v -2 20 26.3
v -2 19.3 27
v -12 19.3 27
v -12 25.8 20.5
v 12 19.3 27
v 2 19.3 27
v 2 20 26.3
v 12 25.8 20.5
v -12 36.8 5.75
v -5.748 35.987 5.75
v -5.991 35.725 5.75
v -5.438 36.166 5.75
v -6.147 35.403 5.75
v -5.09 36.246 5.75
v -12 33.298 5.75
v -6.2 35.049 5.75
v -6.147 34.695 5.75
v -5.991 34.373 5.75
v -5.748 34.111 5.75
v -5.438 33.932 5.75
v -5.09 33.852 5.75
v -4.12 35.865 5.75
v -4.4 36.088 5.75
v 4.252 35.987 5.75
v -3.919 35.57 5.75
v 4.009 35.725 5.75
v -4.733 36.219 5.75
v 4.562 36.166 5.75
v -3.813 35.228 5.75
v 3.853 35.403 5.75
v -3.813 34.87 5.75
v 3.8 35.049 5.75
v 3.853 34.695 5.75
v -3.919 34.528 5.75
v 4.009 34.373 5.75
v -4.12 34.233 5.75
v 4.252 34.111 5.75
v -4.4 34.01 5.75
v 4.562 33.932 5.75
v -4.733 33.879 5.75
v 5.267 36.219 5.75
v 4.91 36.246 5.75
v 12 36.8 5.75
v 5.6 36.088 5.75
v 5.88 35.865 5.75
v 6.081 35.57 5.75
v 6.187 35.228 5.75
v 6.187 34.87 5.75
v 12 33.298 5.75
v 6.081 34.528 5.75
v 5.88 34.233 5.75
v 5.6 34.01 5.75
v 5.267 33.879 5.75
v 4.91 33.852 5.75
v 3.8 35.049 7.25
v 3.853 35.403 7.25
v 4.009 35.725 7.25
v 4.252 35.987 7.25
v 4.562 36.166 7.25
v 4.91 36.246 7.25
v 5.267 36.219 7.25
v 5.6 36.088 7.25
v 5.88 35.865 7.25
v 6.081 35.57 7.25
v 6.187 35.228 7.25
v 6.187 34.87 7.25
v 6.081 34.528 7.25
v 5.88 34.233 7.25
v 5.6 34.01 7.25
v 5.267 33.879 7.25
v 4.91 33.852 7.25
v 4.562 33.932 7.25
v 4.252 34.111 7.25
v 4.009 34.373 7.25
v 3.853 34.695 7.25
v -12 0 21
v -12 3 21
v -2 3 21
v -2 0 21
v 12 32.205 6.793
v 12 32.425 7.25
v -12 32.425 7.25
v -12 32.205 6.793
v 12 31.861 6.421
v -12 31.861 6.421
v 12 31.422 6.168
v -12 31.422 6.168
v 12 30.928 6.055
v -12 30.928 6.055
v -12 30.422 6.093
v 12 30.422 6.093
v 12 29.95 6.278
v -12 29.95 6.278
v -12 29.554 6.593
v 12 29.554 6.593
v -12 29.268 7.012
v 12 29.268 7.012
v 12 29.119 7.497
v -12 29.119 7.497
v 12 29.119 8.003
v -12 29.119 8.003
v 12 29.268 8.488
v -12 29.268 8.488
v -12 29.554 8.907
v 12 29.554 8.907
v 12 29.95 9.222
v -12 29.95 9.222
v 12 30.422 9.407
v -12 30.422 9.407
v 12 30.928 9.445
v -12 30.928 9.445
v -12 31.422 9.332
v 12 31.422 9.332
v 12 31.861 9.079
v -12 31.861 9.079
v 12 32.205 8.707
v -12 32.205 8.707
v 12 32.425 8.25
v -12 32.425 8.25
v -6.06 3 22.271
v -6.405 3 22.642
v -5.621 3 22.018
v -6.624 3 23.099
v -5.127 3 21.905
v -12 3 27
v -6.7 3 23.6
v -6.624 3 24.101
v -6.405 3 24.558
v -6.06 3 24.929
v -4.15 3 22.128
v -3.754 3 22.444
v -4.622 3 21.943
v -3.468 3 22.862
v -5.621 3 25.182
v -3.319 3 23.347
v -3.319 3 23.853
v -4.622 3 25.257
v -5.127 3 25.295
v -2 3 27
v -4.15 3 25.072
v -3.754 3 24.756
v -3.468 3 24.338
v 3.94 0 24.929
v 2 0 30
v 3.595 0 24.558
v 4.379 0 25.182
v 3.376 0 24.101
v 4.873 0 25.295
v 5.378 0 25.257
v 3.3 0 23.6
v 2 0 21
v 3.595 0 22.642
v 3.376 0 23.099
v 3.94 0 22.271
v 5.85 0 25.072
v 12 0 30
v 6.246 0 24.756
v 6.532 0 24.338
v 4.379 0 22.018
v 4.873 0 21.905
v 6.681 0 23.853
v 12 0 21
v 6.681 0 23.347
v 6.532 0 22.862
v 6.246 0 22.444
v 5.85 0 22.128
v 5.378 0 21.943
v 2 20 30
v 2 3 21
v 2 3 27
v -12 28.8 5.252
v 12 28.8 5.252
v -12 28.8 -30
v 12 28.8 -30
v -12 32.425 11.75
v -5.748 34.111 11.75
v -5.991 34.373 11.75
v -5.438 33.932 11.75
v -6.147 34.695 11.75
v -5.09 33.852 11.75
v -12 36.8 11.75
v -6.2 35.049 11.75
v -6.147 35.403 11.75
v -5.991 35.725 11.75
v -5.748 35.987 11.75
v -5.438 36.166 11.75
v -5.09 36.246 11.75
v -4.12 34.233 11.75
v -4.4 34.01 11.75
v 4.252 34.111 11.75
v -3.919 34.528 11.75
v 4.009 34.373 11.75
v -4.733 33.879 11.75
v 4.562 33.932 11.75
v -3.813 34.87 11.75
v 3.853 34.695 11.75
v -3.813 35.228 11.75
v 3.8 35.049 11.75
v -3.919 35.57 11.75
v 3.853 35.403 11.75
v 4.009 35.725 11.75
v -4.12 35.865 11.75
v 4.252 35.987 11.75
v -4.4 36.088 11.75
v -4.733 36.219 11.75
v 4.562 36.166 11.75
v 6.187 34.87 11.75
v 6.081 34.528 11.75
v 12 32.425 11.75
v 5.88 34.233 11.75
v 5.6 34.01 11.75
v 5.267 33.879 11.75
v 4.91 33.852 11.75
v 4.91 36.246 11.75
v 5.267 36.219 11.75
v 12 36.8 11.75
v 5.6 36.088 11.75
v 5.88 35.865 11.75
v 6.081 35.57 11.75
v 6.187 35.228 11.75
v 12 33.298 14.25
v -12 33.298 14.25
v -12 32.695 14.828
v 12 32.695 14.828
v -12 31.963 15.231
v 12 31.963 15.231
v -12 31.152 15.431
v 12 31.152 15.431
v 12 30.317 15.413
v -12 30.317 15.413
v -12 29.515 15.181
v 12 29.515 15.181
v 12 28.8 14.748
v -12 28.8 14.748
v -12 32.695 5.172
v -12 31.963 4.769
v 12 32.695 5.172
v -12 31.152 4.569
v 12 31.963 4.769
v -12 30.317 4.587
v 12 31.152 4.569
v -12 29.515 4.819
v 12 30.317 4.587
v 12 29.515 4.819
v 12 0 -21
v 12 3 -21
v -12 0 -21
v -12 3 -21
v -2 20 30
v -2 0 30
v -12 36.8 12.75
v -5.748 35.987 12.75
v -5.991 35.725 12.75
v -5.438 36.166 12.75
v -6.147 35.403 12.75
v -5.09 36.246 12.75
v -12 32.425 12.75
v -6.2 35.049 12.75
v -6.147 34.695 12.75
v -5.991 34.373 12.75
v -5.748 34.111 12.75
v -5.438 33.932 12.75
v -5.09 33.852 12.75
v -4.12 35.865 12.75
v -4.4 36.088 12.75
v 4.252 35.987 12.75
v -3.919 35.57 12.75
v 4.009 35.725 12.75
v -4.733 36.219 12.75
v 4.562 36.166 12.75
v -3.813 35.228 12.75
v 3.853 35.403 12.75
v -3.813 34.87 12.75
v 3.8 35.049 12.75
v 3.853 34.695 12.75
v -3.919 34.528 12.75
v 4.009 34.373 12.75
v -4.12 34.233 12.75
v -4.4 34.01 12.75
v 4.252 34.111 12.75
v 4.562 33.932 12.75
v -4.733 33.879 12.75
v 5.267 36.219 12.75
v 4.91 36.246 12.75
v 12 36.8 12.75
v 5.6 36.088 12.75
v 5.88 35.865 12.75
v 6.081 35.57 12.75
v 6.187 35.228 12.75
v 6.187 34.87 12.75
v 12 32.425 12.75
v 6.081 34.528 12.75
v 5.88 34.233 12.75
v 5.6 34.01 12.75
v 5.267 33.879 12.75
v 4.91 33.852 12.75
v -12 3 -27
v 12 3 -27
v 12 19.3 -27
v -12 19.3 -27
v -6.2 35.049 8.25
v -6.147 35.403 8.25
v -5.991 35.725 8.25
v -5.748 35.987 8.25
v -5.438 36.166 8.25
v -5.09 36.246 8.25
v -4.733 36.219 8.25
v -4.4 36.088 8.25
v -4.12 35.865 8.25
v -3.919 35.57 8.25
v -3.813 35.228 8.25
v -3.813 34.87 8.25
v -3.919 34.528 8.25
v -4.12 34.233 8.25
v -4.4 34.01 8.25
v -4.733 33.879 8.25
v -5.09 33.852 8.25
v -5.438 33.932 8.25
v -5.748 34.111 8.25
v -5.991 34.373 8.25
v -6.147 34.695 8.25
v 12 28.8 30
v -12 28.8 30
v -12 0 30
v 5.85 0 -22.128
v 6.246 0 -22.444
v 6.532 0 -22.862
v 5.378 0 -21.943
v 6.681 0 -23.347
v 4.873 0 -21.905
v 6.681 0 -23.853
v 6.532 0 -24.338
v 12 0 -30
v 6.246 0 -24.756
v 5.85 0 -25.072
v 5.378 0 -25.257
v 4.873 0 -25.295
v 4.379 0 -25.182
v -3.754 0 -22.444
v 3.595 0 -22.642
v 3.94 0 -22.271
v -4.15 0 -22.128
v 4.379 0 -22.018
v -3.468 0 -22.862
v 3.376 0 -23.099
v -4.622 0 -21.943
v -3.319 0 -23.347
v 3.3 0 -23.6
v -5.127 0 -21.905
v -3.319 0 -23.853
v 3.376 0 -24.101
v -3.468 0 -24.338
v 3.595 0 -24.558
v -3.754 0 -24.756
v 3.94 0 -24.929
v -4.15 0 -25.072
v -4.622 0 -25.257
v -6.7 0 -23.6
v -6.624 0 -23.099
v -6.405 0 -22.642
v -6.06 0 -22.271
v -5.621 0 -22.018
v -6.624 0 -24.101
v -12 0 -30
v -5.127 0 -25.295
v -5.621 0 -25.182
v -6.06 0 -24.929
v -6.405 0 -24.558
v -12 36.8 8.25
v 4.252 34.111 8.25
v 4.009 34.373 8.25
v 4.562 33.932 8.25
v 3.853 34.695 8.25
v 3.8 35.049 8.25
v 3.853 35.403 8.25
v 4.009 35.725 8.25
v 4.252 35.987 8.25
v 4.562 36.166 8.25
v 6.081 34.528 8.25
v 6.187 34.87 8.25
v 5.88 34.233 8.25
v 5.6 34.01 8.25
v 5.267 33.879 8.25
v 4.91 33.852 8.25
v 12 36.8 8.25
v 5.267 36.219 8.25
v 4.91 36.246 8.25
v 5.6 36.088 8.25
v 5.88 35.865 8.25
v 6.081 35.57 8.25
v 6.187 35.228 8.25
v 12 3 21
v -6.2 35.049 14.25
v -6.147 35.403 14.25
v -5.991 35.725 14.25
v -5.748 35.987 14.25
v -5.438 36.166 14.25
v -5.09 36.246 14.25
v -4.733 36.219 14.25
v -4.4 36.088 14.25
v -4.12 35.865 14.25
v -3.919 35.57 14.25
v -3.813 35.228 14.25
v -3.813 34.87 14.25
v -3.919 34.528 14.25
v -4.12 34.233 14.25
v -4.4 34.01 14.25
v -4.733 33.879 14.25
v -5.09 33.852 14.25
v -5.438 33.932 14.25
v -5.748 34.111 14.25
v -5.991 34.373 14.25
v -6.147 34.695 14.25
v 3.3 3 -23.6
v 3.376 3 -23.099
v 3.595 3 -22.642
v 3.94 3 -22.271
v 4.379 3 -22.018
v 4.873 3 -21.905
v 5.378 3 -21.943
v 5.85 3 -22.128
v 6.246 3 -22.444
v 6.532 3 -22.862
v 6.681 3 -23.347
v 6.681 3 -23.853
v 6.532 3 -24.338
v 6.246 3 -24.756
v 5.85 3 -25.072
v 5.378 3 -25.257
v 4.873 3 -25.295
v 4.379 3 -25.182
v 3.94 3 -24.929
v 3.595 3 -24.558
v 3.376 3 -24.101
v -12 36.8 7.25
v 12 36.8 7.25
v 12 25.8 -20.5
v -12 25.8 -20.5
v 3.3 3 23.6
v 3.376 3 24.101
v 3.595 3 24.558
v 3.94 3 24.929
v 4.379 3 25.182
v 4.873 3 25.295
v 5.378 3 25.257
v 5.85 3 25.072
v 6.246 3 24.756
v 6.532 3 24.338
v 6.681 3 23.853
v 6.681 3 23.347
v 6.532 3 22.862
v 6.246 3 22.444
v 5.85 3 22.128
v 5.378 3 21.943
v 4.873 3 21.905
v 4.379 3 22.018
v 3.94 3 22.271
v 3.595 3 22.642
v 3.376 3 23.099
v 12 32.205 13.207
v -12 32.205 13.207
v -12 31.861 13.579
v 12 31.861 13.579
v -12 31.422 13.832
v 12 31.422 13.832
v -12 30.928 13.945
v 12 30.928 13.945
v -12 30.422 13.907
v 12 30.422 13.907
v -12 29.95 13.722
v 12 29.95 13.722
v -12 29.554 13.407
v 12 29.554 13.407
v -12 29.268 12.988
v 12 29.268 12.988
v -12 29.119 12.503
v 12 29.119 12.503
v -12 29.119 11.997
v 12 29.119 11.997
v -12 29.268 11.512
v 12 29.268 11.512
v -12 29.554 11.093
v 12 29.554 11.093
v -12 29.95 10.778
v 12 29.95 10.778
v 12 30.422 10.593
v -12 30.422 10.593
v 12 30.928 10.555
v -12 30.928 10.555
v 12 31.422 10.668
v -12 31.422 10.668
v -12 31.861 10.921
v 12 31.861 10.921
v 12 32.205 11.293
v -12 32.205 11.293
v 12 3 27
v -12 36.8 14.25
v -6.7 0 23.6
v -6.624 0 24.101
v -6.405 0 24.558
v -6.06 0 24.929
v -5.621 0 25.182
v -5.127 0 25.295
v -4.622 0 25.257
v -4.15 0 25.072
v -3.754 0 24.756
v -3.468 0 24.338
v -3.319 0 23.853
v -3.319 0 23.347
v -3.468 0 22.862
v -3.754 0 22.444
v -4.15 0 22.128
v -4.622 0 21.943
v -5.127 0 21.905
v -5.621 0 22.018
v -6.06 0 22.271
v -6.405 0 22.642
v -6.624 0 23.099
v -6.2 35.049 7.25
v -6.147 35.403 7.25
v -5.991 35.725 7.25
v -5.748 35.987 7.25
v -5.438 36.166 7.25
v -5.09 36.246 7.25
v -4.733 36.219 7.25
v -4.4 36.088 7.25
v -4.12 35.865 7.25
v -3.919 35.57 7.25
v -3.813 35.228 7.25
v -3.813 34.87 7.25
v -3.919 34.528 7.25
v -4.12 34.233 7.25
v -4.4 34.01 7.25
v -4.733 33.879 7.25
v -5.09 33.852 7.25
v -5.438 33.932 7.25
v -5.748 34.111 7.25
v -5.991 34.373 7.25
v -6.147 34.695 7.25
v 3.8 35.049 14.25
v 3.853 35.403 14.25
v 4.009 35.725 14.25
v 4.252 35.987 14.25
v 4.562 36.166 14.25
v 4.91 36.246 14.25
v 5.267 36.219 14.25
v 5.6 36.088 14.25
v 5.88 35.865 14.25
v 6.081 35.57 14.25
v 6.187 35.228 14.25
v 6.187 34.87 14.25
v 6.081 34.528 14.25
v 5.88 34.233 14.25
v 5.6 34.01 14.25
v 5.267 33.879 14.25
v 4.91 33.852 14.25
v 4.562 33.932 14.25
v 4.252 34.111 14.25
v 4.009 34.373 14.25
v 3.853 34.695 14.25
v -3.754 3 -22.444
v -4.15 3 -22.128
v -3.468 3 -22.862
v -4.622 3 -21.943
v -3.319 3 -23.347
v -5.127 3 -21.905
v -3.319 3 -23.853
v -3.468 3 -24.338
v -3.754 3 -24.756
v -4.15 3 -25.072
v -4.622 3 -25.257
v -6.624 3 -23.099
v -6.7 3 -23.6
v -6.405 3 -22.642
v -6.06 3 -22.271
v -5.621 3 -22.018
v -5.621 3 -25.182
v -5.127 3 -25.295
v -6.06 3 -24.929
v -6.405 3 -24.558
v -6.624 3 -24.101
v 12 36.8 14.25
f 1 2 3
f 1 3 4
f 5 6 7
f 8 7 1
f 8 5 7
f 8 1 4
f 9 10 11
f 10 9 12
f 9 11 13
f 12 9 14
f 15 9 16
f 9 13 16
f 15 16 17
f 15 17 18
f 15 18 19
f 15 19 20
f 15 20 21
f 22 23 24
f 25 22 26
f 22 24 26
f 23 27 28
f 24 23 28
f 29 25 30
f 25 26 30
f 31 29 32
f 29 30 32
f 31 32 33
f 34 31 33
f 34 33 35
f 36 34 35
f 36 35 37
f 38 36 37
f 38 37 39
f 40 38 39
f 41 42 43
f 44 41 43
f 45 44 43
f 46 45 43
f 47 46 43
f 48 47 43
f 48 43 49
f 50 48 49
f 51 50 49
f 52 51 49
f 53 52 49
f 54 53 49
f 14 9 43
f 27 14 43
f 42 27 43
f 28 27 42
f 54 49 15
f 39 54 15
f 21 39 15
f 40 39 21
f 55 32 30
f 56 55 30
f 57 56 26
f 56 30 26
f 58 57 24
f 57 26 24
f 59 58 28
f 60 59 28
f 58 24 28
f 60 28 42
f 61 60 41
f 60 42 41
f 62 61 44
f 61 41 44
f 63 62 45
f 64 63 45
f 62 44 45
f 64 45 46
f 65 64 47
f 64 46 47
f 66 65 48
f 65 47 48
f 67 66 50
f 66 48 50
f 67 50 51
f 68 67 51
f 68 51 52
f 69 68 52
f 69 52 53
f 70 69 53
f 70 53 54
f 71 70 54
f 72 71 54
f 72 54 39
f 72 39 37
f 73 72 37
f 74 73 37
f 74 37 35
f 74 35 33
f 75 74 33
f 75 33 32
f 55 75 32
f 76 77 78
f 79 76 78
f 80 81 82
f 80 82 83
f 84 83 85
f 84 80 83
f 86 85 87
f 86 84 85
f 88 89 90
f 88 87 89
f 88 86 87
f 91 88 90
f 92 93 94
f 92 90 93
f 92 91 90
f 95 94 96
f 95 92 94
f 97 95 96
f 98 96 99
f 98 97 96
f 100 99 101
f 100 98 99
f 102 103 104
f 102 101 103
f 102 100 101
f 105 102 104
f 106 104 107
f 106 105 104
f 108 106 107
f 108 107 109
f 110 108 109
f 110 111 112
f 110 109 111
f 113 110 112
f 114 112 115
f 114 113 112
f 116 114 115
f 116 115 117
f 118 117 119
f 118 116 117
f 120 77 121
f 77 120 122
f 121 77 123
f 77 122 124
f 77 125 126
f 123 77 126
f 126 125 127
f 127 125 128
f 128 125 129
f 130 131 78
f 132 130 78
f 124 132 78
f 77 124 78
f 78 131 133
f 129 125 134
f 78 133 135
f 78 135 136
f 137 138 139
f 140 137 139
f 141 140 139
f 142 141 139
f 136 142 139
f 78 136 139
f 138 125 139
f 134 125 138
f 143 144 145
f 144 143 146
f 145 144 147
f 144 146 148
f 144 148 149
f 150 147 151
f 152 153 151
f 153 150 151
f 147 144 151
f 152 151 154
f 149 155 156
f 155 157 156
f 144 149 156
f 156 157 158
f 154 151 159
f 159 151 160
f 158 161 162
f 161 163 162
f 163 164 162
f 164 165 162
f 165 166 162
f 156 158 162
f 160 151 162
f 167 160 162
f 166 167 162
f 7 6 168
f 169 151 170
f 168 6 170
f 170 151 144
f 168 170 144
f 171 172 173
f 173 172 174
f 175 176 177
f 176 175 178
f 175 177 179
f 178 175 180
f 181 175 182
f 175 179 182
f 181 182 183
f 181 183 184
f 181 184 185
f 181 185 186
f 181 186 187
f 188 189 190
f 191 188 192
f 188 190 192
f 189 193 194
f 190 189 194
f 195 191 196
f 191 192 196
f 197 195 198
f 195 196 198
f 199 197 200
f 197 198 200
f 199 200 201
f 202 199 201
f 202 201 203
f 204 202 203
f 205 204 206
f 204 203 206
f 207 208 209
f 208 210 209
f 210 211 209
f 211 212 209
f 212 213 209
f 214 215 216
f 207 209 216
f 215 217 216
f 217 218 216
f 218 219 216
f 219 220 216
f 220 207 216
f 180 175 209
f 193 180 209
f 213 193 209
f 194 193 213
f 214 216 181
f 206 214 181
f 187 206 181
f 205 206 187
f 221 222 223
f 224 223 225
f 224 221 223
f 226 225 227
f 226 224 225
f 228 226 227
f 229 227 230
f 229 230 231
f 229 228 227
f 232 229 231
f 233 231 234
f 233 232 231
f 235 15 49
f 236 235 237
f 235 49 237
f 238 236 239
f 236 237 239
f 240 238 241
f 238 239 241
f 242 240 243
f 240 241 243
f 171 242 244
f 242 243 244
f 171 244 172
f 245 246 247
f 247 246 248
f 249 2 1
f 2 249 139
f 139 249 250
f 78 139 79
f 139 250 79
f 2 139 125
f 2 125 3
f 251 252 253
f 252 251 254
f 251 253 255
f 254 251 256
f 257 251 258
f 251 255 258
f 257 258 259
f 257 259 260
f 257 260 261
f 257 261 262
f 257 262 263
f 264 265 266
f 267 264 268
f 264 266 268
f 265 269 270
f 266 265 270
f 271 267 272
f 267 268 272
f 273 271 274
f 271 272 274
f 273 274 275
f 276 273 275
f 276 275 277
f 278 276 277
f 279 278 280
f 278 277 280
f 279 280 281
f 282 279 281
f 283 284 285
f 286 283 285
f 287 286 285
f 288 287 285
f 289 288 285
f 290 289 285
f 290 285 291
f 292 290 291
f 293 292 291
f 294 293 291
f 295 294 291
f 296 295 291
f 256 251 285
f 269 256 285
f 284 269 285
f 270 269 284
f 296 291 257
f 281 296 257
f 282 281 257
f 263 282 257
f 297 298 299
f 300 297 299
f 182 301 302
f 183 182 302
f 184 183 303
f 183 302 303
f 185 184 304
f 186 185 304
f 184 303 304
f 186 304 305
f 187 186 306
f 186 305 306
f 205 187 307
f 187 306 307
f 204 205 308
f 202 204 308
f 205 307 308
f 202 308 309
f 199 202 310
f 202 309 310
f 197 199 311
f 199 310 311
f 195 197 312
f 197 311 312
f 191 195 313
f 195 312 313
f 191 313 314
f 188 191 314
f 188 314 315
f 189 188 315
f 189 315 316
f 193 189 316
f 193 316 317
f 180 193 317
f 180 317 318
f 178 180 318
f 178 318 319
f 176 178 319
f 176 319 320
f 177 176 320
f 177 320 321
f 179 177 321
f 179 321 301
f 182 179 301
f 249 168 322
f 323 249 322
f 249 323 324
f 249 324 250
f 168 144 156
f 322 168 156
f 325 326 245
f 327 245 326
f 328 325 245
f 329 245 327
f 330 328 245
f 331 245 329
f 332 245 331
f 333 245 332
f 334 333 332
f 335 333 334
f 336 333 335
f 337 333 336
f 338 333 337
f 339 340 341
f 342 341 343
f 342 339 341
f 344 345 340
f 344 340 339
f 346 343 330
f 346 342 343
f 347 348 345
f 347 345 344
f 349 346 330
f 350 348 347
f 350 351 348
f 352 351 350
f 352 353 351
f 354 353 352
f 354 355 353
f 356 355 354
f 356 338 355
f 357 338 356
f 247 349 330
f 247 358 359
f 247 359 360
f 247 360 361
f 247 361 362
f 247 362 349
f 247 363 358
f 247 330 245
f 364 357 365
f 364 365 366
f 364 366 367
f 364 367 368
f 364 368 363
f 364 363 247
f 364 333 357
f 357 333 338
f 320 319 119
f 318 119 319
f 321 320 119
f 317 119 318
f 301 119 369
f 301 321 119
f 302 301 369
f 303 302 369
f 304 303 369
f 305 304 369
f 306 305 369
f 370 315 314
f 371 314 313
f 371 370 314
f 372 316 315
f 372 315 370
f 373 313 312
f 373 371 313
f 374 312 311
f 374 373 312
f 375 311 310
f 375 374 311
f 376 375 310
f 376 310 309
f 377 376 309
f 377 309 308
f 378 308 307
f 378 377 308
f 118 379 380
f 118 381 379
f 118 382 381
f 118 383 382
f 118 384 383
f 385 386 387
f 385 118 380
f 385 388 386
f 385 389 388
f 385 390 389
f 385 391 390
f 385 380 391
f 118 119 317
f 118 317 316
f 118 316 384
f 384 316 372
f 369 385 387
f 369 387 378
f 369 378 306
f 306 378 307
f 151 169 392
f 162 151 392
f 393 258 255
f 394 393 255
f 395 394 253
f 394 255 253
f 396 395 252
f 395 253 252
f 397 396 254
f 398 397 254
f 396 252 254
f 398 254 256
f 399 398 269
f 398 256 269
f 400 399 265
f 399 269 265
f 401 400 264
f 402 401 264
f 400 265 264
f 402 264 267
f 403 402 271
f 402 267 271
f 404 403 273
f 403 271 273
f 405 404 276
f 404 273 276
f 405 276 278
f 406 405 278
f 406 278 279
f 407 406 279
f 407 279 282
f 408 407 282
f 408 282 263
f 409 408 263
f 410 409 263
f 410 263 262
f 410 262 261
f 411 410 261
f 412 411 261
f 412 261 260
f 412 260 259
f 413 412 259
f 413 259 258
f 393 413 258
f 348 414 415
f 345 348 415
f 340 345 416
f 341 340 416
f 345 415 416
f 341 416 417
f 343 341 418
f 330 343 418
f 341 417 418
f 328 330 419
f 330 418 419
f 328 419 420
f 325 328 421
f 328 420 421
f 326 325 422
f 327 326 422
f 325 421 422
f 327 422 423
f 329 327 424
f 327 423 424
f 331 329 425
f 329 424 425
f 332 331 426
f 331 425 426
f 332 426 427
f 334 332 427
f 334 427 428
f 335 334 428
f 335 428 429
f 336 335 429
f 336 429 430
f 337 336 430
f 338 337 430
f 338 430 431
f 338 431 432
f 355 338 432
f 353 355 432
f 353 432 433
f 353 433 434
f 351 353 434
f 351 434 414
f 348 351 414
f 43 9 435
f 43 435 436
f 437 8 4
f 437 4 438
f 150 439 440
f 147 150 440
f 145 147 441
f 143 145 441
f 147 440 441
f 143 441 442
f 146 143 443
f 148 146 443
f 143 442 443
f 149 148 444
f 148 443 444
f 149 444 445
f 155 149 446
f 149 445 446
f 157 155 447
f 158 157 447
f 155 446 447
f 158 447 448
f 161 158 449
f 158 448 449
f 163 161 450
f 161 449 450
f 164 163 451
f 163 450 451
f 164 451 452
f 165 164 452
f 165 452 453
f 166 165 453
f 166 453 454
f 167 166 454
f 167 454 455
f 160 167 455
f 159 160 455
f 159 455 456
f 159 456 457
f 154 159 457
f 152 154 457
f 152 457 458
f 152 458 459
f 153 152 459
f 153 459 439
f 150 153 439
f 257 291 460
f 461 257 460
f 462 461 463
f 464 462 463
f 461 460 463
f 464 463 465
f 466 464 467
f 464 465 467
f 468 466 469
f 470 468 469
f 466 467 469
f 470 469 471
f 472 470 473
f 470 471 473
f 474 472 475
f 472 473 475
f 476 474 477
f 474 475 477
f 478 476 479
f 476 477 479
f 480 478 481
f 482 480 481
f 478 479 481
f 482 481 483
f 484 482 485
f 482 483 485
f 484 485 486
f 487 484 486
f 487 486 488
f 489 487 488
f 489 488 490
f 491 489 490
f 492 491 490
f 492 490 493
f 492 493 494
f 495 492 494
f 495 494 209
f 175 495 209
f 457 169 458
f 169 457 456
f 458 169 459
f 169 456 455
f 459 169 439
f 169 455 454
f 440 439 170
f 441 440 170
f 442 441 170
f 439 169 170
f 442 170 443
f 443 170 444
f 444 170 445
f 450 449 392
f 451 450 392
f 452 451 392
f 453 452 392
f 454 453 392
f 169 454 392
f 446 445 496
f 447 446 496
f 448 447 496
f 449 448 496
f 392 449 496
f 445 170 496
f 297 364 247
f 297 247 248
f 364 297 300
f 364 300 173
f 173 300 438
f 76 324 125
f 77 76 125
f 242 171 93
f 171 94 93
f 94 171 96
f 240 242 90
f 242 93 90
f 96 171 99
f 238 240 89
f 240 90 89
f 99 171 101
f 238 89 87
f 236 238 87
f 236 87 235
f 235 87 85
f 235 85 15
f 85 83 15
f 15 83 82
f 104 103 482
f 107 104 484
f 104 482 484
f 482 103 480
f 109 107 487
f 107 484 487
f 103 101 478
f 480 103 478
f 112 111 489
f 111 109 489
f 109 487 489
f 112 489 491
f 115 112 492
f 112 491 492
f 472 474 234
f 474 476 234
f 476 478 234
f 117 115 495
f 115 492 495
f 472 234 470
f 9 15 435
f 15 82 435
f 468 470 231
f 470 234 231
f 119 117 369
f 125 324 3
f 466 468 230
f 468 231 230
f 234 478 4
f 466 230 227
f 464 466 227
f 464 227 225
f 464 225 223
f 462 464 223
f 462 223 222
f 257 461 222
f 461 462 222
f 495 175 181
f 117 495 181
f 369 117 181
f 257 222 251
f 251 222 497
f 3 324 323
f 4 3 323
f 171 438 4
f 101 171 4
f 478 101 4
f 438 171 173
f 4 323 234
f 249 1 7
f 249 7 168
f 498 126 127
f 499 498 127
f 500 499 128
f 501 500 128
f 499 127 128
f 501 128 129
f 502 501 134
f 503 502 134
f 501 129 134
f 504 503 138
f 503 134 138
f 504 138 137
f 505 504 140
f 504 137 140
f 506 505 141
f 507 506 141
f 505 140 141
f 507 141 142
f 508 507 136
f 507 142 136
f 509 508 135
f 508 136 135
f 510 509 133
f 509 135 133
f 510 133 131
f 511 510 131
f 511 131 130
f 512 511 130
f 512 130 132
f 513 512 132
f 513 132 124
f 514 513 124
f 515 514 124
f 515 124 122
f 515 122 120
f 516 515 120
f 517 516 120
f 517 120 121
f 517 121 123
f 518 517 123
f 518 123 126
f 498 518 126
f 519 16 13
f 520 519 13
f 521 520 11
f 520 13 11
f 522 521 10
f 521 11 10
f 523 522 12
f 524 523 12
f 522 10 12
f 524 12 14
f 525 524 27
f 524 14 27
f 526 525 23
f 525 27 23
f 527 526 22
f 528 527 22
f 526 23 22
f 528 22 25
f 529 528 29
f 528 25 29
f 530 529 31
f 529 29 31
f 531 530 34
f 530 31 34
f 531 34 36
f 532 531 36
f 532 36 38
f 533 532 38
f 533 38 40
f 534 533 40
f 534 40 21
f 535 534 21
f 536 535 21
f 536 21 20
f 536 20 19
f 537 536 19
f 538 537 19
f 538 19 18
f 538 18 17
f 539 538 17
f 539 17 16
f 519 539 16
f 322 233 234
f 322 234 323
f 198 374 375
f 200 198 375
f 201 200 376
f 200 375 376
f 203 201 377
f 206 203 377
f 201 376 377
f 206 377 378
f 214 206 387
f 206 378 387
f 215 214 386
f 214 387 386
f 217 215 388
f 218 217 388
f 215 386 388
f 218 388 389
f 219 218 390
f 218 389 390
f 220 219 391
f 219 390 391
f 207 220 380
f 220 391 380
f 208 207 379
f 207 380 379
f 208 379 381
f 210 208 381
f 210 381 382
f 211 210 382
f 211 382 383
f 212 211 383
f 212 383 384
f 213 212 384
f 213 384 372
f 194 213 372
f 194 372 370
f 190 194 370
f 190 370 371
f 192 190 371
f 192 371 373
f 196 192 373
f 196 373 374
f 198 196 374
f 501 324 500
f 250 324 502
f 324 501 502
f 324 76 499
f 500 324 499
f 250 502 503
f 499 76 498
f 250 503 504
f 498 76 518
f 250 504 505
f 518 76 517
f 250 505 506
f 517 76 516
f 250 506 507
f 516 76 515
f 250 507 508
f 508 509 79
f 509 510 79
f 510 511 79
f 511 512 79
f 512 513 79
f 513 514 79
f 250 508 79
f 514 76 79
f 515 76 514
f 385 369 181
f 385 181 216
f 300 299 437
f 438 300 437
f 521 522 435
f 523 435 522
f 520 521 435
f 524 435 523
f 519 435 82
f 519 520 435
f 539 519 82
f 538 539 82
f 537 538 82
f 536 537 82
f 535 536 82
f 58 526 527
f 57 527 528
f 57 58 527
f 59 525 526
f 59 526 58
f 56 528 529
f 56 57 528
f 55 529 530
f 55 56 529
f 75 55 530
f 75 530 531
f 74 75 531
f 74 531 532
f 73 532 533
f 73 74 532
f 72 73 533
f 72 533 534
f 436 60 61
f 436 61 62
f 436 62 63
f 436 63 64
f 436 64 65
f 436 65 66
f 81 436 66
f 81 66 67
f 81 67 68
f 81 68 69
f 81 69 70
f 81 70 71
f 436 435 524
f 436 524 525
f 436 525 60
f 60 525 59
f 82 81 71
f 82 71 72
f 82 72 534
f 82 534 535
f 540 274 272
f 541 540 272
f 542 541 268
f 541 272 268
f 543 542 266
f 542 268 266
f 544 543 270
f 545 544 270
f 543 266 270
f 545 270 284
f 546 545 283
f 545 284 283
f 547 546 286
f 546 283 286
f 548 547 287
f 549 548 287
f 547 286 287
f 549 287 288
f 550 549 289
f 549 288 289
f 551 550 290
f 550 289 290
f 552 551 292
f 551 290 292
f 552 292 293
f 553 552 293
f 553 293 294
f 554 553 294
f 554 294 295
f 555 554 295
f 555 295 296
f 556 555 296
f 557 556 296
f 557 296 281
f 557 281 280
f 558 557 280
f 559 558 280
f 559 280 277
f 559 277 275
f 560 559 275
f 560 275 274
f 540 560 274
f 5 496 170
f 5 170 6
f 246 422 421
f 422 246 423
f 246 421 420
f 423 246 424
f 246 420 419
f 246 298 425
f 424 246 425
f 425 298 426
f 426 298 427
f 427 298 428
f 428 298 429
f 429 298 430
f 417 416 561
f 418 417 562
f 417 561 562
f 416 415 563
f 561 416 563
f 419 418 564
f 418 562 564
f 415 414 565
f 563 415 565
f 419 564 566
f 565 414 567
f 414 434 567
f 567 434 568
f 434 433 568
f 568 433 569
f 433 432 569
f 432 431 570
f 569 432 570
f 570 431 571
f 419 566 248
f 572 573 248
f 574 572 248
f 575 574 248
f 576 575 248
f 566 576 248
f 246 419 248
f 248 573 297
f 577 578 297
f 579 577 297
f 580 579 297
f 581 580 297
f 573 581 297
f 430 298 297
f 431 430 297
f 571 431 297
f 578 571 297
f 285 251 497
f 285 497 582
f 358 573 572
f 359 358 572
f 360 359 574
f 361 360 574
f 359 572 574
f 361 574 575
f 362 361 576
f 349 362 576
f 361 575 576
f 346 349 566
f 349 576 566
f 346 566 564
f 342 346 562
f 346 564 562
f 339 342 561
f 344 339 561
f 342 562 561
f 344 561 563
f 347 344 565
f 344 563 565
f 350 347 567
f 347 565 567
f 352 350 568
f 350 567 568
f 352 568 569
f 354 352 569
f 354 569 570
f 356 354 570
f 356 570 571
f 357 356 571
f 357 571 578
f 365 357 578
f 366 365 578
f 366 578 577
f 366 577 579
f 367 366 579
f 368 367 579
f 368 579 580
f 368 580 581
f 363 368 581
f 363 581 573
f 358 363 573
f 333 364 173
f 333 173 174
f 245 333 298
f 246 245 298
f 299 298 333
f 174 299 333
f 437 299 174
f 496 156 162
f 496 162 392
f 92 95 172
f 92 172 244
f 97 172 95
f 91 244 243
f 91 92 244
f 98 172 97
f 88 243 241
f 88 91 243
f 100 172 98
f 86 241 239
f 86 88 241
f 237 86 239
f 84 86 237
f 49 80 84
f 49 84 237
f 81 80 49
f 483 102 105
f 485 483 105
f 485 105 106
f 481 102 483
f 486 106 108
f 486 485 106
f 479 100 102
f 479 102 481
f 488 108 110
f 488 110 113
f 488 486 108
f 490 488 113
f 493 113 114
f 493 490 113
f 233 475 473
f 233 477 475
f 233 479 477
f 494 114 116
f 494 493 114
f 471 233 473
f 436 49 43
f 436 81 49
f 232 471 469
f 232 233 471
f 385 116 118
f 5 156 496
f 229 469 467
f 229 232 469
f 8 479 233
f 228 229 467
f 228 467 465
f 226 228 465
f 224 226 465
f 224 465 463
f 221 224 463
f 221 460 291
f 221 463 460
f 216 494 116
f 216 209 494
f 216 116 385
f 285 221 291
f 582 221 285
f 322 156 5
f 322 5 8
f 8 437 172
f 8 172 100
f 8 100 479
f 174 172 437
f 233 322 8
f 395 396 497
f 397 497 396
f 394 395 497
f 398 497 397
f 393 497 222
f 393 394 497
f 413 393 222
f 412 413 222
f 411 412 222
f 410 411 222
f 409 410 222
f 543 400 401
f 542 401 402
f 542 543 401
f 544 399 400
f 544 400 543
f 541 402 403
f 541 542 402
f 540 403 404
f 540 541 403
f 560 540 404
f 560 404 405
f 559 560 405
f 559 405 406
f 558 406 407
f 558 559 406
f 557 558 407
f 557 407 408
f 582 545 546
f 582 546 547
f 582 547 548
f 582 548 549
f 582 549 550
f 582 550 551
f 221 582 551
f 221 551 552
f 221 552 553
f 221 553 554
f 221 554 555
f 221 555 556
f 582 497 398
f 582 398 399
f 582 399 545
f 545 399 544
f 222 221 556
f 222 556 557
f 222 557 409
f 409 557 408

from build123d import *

# Parameters (mm, degrees)
SKETCH1_W           = 24
SKETCH1_H           = 60
BOSS_EXTRUDE1_DEPTH = 36.8
CUT_EXTRUDE1_DEPTH  = 54.2
CUT_EXTRUDE2_DEPTH  = 54.2
SKETCH4_R           = 1.2
CUT_EXTRUDE3_DEPTH  = 53.690630097
SKETCH5_W           = 54
SKETCH5_H           = 25.8
CUT_EXTRUDE4_DEPTH  = 54.2
SKETCH6_W           = 24
SKETCH6_H           = 3
BOSS_EXTRUDE2_DEPTH = 9
SKETCH7_W           = 24
SKETCH7_H           = 3
BOSS_EXTRUDE3_DEPTH = 9
SKETCH8_R           = 1.7
CUT_EXTRUDE5_DEPTH  = 6
SKETCH9_W           = 4
SKETCH9_H           = 20
CUT_EXTRUDE6_DEPTH  = 17
CHAMFER1_SIZE       = 6.5


with BuildPart() as part:
    # Sketch1 → Boss-Extrude1 (new body)
    with BuildSketch(Plane(origin=(0, 0, 0), x_dir=(1, 0, 0), z_dir=(0, 1, 0))):
        Rectangle(SKETCH1_W, SKETCH1_H)
    extrude(amount=BOSS_EXTRUDE1_DEPTH)

    # Sketch2 → Cut-Extrude1 (cut, through all)
    with BuildSketch(Plane(origin=(12, 0, 0), x_dir=(0, 0, -1), z_dir=(1, 0, 0))):
        with BuildLine():
            Line((-12.75, 36.8), (-12.75, 32.424807681))
            ThreePointArc((-12.75, 32.424807681), (-12.25, 29.1), (-11.75, 32.424807681))
            Line((-11.75, 32.424807681), (-11.75, 36.8))
            Line((-11.75, 36.8), (-12.75, 36.8))
        make_face()
        with BuildLine():
            Line((-8.25, 32.424807681), (-8.25, 36.8))
            Line((-8.25, 36.8), (-7.25, 36.8))
            Line((-7.25, 36.8), (-7.25, 32.424807681))
            ThreePointArc((-7.25, 32.424807681), (-7.75, 29.1), (-8.25, 32.424807681))
        make_face()
    extrude(amount=-CUT_EXTRUDE1_DEPTH, mode=Mode.SUBTRACT)

    # Sketch3 → Cut-Extrude2 (cut, through all)
    with BuildSketch(Plane(origin=(12, 0, 0), x_dir=(0, 0, -1), z_dir=(1, 0, 0))):
        with BuildLine():
            Line((-14.25, 36.8), (-14.25, 33.297999199))
            ThreePointArc((-14.25, 33.297999199), (-15.430565736, 31.152138611), (-14.747999199, 28.8))
            Line((-14.747999199, 28.8), (-30, 28.8))
            Line((-30, 28.8), (-30, 36.8))
            Line((-30, 36.8), (-14.25, 36.8))
        make_face()
        with BuildLine():
            Line((30, 28.8), (30, 36.8))
            Line((30, 36.8), (-5.75, 36.8))
            Line((-5.75, 36.8), (-5.75, 33.297999199))
            ThreePointArc((-5.75, 33.297999199), (-4.569434264, 31.152138611), (-5.252000801, 28.8))
            Line((-5.252000801, 28.8), (30, 28.8))
        make_face()
    extrude(amount=-CUT_EXTRUDE2_DEPTH, mode=Mode.SUBTRACT)

    # Sketch4 → Cut-Extrude3 (cut, through all)
    with BuildSketch(Plane(origin=(0, 0, 5.75), x_dir=(-1, 0, 0), z_dir=(0, 0, -1))):
        with Locations((-5, 35.0489996)):
            Circle(SKETCH4_R)
        with Locations((5, 35.0489996)):
            Circle(SKETCH4_R)
    extrude(amount=-CUT_EXTRUDE3_DEPTH, mode=Mode.SUBTRACT)

    # Sketch5 → Cut-Extrude4 (cut, through all)
    with BuildSketch(Plane(origin=(12, 0, 0), x_dir=(0, 0, -1), z_dir=(1, 0, 0))):
        with Locations((0, 12.9)):
            Rectangle(SKETCH5_W, SKETCH5_H)
    extrude(amount=-CUT_EXTRUDE4_DEPTH, mode=Mode.SUBTRACT)

    # Sketch6 → Boss-Extrude2 (add)
    with BuildSketch(Plane(origin=(0, 0, -30), x_dir=(-1, 0, 0), z_dir=(0, 0, -1))):
        with Locations((0, 1.5)):
            Rectangle(SKETCH6_W, SKETCH6_H)
    extrude(amount=-BOSS_EXTRUDE2_DEPTH)

    # Sketch7 → Boss-Extrude3 (add)
    with BuildSketch(Plane.XY.offset(30)):
        with Locations((0, 1.5)):
            Rectangle(SKETCH7_W, SKETCH7_H)
    extrude(amount=-BOSS_EXTRUDE3_DEPTH)

    # Sketch8 → Cut-Extrude5 (cut)
    with BuildSketch(Plane(origin=(0, 3, 0), x_dir=(1, 0, 0), z_dir=(0, 1, 0))):
        with Locations(Location((-5, 23.6, 0), (0, 0, 180))):
            Circle(SKETCH8_R)
        with Locations(Location((5, 23.6, 0), (0, 0, 180))):
            Circle(SKETCH8_R)
        with Locations(Location((-5, -23.6, 0), (0, 0, 180))):
            Circle(SKETCH8_R)
        with Locations(Location((5, -23.6, 0), (0, 0, 180))):
            Circle(SKETCH8_R)
    extrude(amount=-CUT_EXTRUDE5_DEPTH, mode=Mode.SUBTRACT)

    # Sketch9 → Cut-Extrude6 (cut)
    with BuildSketch(Plane.XY.offset(30)):
        with Locations((0, 10)):
            Rectangle(SKETCH9_W, SKETCH9_H)
    extrude(amount=-CUT_EXTRUDE6_DEPTH, mode=Mode.SUBTRACT)

    # Chamfer1
    # the kernel refuses this chamfer: 6.5 mm, written as the material it adds along each edge
    with BuildSketch(Plane(origin=(12, 25.8, -27), x_dir=(0, -0.9996219169112968, -0.027495876610587486), z_dir=(-1, 0, 0))) as chamfer1_piece_1:
        Polygon((CHAMFER1_SIZE * 0.999621916911, CHAMFER1_SIZE * 0.0274958766106), (-CHAMFER1_SIZE * 0.0274958766106, CHAMFER1_SIZE * 0.999621916911), (0, 0), align=None)
    extrude(amount=24)
    with BuildSketch(Plane(origin=(12, 25.8, 27), x_dir=(0, -0.9996219169112968, 0.027495876610586424), z_dir=(-1, 0, 0))) as chamfer1_piece_2_section:
        Polygon((CHAMFER1_SIZE * 0.999621916911, -CHAMFER1_SIZE * 0.0274958766106), (-CHAMFER1_SIZE * 0.0274958766106, -CHAMFER1_SIZE * 0.999621916911), (0, 0), align=None)
    chamfer1_piece_2 = extrude(amount=24, mode=Mode.PRIVATE)
    chamfer1_piece_2 = split(chamfer1_piece_2, bisect_by=Plane(origin=(7, 20, 26.950497718), z_dir=(0, -1, 0)), keep=Keep.TOP, mode=Mode.PRIVATE)
    chamfer1_piece_2 = split(chamfer1_piece_2, bisect_by=Plane(origin=(2, 19.670055839, 26.950497718), z_dir=(1, 0, 0)), keep=Keep.TOP, mode=Mode.PRIVATE)
    add(chamfer1_piece_2)
    with BuildSketch(Plane(origin=(12, 25.8, 27), x_dir=(0, -0.9996219169112968, 0.027495876610586424), z_dir=(-1, 0, 0))) as chamfer1_piece_3_section:
        Polygon((CHAMFER1_SIZE * 0.999621916911, -CHAMFER1_SIZE * 0.0274958766106), (-CHAMFER1_SIZE * 0.0274958766106, -CHAMFER1_SIZE * 0.999621916911), (0, 0), align=None)
    chamfer1_piece_3 = extrude(amount=24, mode=Mode.PRIVATE)
    chamfer1_piece_3 = split(chamfer1_piece_3, bisect_by=Plane(origin=(7, 20, 24.812647942), z_dir=(0, 1, 0)), keep=Keep.TOP, mode=Mode.PRIVATE)
    chamfer1_piece_3 = split(chamfer1_piece_3, bisect_by=Plane(origin=(2, 23.739513204, 24.812647942), z_dir=(1, 0, 0)), keep=Keep.TOP, mode=Mode.PRIVATE)
    add(chamfer1_piece_3)
    with BuildSketch(Plane(origin=(12, 25.8, 27), x_dir=(0, -0.9996219169112968, 0.027495876610586424), z_dir=(-1, 0, 0))) as chamfer1_piece_4_section:
        Polygon((CHAMFER1_SIZE * 0.999621916911, -CHAMFER1_SIZE * 0.0274958766106), (-CHAMFER1_SIZE * 0.0274958766106, -CHAMFER1_SIZE * 0.999621916911), (0, 0), align=None)
    chamfer1_piece_4 = extrude(amount=24, mode=Mode.PRIVATE)
    chamfer1_piece_4 = split(chamfer1_piece_4, bisect_by=Plane(origin=(-2, 23.739513204, 24.812647942), z_dir=(1, 0, 0)), keep=Keep.TOP, mode=Mode.PRIVATE)
    chamfer1_piece_4 = split(chamfer1_piece_4, bisect_by=Plane(origin=(0, 20, 24.812647942), z_dir=(0, 1, 0)), keep=Keep.TOP, mode=Mode.PRIVATE)
    chamfer1_piece_4 = split(chamfer1_piece_4, bisect_by=Plane(origin=(2, 23.739513204, 24.812647942), z_dir=(-1, 0, 0)), keep=Keep.TOP, mode=Mode.PRIVATE)
    add(chamfer1_piece_4)
    with BuildSketch(Plane(origin=(12, 25.8, 27), x_dir=(0, -0.9996219169112968, 0.027495876610586424), z_dir=(-1, 0, 0))) as chamfer1_piece_5_section:
        Polygon((CHAMFER1_SIZE * 0.999621916911, -CHAMFER1_SIZE * 0.0274958766106), (-CHAMFER1_SIZE * 0.0274958766106, -CHAMFER1_SIZE * 0.999621916911), (0, 0), align=None)
    chamfer1_piece_5 = extrude(amount=24, mode=Mode.PRIVATE)
    chamfer1_piece_5 = split(chamfer1_piece_5, bisect_by=Plane(origin=(-2, 19.670055839, 26.950497718), z_dir=(-1, 0, 0)), keep=Keep.TOP, mode=Mode.PRIVATE)
    chamfer1_piece_5 = split(chamfer1_piece_5, bisect_by=Plane(origin=(-7, 20, 26.950497718), z_dir=(0, -1, 0)), keep=Keep.TOP, mode=Mode.PRIVATE)
    add(chamfer1_piece_5)
    with BuildSketch(Plane(origin=(12, 25.8, 27), x_dir=(0, -0.9996219169112968, 0.027495876610586424), z_dir=(-1, 0, 0))) as chamfer1_piece_6_section:
        Polygon((CHAMFER1_SIZE * 0.999621916911, -CHAMFER1_SIZE * 0.0274958766106), (-CHAMFER1_SIZE * 0.0274958766106, -CHAMFER1_SIZE * 0.999621916911), (0, 0), align=None)
    chamfer1_piece_6 = extrude(amount=24, mode=Mode.PRIVATE)
    chamfer1_piece_6 = split(chamfer1_piece_6, bisect_by=Plane(origin=(-2, 23.739513204, 24.812647942), z_dir=(-1, 0, 0)), keep=Keep.TOP, mode=Mode.PRIVATE)
    chamfer1_piece_6 = split(chamfer1_piece_6, bisect_by=Plane(origin=(-7, 20, 24.812647942), z_dir=(0, 1, 0)), keep=Keep.TOP, mode=Mode.PRIVATE)
    add(chamfer1_piece_6)


solid = part.part
